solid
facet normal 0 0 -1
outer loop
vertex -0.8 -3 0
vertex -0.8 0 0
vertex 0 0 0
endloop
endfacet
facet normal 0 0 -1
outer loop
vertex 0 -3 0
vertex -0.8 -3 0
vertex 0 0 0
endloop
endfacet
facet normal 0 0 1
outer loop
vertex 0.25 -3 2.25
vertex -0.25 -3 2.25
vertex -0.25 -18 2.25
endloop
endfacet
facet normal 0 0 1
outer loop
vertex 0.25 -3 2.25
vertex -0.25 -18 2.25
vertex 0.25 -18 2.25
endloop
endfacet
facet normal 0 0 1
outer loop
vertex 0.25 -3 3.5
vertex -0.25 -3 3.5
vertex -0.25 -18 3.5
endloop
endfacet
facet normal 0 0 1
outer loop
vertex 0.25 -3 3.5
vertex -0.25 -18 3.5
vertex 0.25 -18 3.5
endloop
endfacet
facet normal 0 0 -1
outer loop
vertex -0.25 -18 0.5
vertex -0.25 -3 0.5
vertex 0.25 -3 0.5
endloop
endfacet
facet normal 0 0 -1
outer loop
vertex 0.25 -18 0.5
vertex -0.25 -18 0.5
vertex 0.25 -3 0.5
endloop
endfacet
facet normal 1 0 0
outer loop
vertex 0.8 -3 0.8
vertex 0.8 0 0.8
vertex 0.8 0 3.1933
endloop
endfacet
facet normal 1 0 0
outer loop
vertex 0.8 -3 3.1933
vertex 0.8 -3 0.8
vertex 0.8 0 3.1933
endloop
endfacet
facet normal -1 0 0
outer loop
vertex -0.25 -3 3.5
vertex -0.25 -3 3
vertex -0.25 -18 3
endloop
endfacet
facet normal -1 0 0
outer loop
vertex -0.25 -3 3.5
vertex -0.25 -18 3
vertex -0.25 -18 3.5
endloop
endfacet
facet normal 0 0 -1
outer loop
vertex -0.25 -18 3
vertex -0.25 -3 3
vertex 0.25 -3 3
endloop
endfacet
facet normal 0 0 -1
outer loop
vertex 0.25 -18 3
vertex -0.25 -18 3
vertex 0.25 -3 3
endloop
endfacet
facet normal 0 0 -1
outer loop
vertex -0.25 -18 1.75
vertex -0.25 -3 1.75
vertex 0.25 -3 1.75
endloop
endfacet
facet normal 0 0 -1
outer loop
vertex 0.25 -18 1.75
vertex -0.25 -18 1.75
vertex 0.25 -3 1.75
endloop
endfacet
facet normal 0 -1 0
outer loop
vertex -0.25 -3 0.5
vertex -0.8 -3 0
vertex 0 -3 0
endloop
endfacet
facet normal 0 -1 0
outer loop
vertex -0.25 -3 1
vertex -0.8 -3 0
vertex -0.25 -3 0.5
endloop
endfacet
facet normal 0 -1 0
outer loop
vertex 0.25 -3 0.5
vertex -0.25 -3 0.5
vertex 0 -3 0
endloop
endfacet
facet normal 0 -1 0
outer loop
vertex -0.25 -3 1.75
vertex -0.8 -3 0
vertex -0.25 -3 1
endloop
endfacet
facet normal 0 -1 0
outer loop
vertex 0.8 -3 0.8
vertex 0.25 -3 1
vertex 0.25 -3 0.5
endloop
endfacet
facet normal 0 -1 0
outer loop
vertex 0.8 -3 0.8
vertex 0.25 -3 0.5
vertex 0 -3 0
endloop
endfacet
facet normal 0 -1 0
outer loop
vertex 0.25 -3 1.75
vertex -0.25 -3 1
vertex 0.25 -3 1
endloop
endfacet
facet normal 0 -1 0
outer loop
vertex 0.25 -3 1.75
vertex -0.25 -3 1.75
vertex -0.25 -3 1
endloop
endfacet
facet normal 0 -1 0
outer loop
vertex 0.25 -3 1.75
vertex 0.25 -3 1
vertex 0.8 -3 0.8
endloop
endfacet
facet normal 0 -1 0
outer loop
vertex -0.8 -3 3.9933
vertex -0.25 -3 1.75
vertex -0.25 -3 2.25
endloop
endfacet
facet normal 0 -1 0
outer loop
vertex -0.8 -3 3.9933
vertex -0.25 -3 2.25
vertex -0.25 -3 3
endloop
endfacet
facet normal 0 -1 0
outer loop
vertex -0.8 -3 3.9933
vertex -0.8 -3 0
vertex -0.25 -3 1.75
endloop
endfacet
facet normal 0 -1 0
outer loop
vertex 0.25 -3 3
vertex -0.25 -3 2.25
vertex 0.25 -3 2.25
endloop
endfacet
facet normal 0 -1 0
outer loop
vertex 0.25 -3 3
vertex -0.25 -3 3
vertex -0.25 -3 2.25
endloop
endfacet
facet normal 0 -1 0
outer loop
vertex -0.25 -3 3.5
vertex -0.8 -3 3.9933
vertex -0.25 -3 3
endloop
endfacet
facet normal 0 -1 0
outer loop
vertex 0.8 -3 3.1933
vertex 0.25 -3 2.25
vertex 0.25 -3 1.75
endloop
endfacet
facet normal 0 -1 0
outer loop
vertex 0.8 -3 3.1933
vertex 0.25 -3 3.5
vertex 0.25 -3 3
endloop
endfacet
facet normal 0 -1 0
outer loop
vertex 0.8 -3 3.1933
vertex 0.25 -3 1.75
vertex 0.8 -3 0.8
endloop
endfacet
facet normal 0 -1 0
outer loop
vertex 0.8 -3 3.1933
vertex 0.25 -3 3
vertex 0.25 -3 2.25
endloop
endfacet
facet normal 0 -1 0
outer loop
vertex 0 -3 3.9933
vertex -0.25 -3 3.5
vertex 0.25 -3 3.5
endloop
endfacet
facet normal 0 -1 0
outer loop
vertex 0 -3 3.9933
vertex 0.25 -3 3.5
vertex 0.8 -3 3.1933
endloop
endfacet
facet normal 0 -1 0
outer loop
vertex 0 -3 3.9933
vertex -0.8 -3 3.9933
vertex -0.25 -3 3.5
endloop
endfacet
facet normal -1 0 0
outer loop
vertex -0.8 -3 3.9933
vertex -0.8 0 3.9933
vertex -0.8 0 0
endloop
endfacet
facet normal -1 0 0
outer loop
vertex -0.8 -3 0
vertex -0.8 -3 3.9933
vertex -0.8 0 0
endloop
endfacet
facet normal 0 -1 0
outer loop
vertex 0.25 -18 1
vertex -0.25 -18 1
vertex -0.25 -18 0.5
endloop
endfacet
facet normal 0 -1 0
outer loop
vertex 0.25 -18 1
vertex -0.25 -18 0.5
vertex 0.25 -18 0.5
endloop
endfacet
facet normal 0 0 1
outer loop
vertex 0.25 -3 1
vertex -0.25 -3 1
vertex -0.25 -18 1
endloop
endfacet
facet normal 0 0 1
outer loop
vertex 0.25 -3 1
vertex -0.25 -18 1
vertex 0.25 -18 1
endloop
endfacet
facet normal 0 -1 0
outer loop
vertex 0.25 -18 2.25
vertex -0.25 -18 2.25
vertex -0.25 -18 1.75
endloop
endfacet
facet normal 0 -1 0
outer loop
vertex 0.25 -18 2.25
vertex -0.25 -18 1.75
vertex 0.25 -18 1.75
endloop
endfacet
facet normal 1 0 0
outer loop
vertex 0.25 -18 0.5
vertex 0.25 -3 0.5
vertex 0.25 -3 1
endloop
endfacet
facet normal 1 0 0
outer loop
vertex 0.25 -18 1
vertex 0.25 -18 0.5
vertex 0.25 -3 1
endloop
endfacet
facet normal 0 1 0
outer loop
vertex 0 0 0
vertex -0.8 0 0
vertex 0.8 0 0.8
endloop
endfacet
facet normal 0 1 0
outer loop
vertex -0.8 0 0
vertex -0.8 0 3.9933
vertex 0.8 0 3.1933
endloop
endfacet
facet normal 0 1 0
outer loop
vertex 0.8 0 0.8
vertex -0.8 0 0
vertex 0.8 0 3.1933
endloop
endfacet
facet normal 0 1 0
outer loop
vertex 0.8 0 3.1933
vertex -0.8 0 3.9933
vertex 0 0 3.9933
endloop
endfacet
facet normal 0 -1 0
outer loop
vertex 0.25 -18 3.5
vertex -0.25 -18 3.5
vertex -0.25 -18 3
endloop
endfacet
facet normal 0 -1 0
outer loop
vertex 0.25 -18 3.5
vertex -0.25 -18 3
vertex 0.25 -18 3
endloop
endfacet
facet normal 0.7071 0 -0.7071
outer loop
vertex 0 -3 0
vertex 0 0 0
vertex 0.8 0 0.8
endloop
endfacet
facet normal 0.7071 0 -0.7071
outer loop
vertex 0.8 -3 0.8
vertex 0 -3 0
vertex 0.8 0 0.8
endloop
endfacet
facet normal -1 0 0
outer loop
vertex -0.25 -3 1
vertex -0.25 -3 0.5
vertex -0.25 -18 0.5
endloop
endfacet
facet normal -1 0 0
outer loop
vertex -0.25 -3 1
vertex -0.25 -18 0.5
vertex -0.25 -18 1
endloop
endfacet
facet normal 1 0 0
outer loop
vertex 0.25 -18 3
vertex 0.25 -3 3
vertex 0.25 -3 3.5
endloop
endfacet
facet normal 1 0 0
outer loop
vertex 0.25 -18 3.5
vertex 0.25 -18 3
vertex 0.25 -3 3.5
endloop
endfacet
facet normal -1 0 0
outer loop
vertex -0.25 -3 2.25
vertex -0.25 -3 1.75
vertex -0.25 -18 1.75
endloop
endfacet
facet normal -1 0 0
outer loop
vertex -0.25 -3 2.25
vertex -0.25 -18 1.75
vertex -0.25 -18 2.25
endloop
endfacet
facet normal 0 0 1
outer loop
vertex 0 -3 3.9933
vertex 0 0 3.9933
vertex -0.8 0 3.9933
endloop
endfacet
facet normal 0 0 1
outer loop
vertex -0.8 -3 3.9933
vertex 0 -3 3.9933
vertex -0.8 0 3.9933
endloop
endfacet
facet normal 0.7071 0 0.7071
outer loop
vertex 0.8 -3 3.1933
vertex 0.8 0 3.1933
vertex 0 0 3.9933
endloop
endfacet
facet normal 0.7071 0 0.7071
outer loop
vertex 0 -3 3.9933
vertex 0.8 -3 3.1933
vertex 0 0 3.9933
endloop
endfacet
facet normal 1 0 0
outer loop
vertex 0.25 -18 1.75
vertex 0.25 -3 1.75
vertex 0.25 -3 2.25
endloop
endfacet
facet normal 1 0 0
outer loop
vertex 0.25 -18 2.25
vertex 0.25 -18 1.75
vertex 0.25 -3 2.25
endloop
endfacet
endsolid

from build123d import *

# Parameters (mm, degrees)
F0_W     = 0.5
F0_H     = 0.5
F1_DEPTH = 3
F2_DEPTH = 18


with BuildPart() as f1:
    # F0 (on Front) → F1 (new body)
    with BuildSketch(Plane.XZ):
        Polygon((-0.8, 0), (0, 0), (0.8, 0.8), (0.8, 3.193335), (0, 3.993335), (-0.8, 3.993335), align=None)
        with Locations((0, 0.75)):
            Rectangle(F0_W, F0_H, mode=Mode.SUBTRACT)
        with Locations((0, 2)):
            Rectangle(F0_W, F0_H, mode=Mode.SUBTRACT)
        with Locations((0, 3.25)):
            Rectangle(F0_W, F0_H, mode=Mode.SUBTRACT)
    extrude(amount=F1_DEPTH)

    # F0 (on Front) → F2 (join)
    with BuildSketch(Plane.XZ):
        with Locations((0, 3.25)):
            Rectangle(F0_W, F0_H)
        with Locations((0, 2)):
            Rectangle(F0_W, F0_H)
        with Locations((0, 0.75)):
            Rectangle(F0_W, F0_H)
    extrude(amount=F2_DEPTH)


solid = f1.part
